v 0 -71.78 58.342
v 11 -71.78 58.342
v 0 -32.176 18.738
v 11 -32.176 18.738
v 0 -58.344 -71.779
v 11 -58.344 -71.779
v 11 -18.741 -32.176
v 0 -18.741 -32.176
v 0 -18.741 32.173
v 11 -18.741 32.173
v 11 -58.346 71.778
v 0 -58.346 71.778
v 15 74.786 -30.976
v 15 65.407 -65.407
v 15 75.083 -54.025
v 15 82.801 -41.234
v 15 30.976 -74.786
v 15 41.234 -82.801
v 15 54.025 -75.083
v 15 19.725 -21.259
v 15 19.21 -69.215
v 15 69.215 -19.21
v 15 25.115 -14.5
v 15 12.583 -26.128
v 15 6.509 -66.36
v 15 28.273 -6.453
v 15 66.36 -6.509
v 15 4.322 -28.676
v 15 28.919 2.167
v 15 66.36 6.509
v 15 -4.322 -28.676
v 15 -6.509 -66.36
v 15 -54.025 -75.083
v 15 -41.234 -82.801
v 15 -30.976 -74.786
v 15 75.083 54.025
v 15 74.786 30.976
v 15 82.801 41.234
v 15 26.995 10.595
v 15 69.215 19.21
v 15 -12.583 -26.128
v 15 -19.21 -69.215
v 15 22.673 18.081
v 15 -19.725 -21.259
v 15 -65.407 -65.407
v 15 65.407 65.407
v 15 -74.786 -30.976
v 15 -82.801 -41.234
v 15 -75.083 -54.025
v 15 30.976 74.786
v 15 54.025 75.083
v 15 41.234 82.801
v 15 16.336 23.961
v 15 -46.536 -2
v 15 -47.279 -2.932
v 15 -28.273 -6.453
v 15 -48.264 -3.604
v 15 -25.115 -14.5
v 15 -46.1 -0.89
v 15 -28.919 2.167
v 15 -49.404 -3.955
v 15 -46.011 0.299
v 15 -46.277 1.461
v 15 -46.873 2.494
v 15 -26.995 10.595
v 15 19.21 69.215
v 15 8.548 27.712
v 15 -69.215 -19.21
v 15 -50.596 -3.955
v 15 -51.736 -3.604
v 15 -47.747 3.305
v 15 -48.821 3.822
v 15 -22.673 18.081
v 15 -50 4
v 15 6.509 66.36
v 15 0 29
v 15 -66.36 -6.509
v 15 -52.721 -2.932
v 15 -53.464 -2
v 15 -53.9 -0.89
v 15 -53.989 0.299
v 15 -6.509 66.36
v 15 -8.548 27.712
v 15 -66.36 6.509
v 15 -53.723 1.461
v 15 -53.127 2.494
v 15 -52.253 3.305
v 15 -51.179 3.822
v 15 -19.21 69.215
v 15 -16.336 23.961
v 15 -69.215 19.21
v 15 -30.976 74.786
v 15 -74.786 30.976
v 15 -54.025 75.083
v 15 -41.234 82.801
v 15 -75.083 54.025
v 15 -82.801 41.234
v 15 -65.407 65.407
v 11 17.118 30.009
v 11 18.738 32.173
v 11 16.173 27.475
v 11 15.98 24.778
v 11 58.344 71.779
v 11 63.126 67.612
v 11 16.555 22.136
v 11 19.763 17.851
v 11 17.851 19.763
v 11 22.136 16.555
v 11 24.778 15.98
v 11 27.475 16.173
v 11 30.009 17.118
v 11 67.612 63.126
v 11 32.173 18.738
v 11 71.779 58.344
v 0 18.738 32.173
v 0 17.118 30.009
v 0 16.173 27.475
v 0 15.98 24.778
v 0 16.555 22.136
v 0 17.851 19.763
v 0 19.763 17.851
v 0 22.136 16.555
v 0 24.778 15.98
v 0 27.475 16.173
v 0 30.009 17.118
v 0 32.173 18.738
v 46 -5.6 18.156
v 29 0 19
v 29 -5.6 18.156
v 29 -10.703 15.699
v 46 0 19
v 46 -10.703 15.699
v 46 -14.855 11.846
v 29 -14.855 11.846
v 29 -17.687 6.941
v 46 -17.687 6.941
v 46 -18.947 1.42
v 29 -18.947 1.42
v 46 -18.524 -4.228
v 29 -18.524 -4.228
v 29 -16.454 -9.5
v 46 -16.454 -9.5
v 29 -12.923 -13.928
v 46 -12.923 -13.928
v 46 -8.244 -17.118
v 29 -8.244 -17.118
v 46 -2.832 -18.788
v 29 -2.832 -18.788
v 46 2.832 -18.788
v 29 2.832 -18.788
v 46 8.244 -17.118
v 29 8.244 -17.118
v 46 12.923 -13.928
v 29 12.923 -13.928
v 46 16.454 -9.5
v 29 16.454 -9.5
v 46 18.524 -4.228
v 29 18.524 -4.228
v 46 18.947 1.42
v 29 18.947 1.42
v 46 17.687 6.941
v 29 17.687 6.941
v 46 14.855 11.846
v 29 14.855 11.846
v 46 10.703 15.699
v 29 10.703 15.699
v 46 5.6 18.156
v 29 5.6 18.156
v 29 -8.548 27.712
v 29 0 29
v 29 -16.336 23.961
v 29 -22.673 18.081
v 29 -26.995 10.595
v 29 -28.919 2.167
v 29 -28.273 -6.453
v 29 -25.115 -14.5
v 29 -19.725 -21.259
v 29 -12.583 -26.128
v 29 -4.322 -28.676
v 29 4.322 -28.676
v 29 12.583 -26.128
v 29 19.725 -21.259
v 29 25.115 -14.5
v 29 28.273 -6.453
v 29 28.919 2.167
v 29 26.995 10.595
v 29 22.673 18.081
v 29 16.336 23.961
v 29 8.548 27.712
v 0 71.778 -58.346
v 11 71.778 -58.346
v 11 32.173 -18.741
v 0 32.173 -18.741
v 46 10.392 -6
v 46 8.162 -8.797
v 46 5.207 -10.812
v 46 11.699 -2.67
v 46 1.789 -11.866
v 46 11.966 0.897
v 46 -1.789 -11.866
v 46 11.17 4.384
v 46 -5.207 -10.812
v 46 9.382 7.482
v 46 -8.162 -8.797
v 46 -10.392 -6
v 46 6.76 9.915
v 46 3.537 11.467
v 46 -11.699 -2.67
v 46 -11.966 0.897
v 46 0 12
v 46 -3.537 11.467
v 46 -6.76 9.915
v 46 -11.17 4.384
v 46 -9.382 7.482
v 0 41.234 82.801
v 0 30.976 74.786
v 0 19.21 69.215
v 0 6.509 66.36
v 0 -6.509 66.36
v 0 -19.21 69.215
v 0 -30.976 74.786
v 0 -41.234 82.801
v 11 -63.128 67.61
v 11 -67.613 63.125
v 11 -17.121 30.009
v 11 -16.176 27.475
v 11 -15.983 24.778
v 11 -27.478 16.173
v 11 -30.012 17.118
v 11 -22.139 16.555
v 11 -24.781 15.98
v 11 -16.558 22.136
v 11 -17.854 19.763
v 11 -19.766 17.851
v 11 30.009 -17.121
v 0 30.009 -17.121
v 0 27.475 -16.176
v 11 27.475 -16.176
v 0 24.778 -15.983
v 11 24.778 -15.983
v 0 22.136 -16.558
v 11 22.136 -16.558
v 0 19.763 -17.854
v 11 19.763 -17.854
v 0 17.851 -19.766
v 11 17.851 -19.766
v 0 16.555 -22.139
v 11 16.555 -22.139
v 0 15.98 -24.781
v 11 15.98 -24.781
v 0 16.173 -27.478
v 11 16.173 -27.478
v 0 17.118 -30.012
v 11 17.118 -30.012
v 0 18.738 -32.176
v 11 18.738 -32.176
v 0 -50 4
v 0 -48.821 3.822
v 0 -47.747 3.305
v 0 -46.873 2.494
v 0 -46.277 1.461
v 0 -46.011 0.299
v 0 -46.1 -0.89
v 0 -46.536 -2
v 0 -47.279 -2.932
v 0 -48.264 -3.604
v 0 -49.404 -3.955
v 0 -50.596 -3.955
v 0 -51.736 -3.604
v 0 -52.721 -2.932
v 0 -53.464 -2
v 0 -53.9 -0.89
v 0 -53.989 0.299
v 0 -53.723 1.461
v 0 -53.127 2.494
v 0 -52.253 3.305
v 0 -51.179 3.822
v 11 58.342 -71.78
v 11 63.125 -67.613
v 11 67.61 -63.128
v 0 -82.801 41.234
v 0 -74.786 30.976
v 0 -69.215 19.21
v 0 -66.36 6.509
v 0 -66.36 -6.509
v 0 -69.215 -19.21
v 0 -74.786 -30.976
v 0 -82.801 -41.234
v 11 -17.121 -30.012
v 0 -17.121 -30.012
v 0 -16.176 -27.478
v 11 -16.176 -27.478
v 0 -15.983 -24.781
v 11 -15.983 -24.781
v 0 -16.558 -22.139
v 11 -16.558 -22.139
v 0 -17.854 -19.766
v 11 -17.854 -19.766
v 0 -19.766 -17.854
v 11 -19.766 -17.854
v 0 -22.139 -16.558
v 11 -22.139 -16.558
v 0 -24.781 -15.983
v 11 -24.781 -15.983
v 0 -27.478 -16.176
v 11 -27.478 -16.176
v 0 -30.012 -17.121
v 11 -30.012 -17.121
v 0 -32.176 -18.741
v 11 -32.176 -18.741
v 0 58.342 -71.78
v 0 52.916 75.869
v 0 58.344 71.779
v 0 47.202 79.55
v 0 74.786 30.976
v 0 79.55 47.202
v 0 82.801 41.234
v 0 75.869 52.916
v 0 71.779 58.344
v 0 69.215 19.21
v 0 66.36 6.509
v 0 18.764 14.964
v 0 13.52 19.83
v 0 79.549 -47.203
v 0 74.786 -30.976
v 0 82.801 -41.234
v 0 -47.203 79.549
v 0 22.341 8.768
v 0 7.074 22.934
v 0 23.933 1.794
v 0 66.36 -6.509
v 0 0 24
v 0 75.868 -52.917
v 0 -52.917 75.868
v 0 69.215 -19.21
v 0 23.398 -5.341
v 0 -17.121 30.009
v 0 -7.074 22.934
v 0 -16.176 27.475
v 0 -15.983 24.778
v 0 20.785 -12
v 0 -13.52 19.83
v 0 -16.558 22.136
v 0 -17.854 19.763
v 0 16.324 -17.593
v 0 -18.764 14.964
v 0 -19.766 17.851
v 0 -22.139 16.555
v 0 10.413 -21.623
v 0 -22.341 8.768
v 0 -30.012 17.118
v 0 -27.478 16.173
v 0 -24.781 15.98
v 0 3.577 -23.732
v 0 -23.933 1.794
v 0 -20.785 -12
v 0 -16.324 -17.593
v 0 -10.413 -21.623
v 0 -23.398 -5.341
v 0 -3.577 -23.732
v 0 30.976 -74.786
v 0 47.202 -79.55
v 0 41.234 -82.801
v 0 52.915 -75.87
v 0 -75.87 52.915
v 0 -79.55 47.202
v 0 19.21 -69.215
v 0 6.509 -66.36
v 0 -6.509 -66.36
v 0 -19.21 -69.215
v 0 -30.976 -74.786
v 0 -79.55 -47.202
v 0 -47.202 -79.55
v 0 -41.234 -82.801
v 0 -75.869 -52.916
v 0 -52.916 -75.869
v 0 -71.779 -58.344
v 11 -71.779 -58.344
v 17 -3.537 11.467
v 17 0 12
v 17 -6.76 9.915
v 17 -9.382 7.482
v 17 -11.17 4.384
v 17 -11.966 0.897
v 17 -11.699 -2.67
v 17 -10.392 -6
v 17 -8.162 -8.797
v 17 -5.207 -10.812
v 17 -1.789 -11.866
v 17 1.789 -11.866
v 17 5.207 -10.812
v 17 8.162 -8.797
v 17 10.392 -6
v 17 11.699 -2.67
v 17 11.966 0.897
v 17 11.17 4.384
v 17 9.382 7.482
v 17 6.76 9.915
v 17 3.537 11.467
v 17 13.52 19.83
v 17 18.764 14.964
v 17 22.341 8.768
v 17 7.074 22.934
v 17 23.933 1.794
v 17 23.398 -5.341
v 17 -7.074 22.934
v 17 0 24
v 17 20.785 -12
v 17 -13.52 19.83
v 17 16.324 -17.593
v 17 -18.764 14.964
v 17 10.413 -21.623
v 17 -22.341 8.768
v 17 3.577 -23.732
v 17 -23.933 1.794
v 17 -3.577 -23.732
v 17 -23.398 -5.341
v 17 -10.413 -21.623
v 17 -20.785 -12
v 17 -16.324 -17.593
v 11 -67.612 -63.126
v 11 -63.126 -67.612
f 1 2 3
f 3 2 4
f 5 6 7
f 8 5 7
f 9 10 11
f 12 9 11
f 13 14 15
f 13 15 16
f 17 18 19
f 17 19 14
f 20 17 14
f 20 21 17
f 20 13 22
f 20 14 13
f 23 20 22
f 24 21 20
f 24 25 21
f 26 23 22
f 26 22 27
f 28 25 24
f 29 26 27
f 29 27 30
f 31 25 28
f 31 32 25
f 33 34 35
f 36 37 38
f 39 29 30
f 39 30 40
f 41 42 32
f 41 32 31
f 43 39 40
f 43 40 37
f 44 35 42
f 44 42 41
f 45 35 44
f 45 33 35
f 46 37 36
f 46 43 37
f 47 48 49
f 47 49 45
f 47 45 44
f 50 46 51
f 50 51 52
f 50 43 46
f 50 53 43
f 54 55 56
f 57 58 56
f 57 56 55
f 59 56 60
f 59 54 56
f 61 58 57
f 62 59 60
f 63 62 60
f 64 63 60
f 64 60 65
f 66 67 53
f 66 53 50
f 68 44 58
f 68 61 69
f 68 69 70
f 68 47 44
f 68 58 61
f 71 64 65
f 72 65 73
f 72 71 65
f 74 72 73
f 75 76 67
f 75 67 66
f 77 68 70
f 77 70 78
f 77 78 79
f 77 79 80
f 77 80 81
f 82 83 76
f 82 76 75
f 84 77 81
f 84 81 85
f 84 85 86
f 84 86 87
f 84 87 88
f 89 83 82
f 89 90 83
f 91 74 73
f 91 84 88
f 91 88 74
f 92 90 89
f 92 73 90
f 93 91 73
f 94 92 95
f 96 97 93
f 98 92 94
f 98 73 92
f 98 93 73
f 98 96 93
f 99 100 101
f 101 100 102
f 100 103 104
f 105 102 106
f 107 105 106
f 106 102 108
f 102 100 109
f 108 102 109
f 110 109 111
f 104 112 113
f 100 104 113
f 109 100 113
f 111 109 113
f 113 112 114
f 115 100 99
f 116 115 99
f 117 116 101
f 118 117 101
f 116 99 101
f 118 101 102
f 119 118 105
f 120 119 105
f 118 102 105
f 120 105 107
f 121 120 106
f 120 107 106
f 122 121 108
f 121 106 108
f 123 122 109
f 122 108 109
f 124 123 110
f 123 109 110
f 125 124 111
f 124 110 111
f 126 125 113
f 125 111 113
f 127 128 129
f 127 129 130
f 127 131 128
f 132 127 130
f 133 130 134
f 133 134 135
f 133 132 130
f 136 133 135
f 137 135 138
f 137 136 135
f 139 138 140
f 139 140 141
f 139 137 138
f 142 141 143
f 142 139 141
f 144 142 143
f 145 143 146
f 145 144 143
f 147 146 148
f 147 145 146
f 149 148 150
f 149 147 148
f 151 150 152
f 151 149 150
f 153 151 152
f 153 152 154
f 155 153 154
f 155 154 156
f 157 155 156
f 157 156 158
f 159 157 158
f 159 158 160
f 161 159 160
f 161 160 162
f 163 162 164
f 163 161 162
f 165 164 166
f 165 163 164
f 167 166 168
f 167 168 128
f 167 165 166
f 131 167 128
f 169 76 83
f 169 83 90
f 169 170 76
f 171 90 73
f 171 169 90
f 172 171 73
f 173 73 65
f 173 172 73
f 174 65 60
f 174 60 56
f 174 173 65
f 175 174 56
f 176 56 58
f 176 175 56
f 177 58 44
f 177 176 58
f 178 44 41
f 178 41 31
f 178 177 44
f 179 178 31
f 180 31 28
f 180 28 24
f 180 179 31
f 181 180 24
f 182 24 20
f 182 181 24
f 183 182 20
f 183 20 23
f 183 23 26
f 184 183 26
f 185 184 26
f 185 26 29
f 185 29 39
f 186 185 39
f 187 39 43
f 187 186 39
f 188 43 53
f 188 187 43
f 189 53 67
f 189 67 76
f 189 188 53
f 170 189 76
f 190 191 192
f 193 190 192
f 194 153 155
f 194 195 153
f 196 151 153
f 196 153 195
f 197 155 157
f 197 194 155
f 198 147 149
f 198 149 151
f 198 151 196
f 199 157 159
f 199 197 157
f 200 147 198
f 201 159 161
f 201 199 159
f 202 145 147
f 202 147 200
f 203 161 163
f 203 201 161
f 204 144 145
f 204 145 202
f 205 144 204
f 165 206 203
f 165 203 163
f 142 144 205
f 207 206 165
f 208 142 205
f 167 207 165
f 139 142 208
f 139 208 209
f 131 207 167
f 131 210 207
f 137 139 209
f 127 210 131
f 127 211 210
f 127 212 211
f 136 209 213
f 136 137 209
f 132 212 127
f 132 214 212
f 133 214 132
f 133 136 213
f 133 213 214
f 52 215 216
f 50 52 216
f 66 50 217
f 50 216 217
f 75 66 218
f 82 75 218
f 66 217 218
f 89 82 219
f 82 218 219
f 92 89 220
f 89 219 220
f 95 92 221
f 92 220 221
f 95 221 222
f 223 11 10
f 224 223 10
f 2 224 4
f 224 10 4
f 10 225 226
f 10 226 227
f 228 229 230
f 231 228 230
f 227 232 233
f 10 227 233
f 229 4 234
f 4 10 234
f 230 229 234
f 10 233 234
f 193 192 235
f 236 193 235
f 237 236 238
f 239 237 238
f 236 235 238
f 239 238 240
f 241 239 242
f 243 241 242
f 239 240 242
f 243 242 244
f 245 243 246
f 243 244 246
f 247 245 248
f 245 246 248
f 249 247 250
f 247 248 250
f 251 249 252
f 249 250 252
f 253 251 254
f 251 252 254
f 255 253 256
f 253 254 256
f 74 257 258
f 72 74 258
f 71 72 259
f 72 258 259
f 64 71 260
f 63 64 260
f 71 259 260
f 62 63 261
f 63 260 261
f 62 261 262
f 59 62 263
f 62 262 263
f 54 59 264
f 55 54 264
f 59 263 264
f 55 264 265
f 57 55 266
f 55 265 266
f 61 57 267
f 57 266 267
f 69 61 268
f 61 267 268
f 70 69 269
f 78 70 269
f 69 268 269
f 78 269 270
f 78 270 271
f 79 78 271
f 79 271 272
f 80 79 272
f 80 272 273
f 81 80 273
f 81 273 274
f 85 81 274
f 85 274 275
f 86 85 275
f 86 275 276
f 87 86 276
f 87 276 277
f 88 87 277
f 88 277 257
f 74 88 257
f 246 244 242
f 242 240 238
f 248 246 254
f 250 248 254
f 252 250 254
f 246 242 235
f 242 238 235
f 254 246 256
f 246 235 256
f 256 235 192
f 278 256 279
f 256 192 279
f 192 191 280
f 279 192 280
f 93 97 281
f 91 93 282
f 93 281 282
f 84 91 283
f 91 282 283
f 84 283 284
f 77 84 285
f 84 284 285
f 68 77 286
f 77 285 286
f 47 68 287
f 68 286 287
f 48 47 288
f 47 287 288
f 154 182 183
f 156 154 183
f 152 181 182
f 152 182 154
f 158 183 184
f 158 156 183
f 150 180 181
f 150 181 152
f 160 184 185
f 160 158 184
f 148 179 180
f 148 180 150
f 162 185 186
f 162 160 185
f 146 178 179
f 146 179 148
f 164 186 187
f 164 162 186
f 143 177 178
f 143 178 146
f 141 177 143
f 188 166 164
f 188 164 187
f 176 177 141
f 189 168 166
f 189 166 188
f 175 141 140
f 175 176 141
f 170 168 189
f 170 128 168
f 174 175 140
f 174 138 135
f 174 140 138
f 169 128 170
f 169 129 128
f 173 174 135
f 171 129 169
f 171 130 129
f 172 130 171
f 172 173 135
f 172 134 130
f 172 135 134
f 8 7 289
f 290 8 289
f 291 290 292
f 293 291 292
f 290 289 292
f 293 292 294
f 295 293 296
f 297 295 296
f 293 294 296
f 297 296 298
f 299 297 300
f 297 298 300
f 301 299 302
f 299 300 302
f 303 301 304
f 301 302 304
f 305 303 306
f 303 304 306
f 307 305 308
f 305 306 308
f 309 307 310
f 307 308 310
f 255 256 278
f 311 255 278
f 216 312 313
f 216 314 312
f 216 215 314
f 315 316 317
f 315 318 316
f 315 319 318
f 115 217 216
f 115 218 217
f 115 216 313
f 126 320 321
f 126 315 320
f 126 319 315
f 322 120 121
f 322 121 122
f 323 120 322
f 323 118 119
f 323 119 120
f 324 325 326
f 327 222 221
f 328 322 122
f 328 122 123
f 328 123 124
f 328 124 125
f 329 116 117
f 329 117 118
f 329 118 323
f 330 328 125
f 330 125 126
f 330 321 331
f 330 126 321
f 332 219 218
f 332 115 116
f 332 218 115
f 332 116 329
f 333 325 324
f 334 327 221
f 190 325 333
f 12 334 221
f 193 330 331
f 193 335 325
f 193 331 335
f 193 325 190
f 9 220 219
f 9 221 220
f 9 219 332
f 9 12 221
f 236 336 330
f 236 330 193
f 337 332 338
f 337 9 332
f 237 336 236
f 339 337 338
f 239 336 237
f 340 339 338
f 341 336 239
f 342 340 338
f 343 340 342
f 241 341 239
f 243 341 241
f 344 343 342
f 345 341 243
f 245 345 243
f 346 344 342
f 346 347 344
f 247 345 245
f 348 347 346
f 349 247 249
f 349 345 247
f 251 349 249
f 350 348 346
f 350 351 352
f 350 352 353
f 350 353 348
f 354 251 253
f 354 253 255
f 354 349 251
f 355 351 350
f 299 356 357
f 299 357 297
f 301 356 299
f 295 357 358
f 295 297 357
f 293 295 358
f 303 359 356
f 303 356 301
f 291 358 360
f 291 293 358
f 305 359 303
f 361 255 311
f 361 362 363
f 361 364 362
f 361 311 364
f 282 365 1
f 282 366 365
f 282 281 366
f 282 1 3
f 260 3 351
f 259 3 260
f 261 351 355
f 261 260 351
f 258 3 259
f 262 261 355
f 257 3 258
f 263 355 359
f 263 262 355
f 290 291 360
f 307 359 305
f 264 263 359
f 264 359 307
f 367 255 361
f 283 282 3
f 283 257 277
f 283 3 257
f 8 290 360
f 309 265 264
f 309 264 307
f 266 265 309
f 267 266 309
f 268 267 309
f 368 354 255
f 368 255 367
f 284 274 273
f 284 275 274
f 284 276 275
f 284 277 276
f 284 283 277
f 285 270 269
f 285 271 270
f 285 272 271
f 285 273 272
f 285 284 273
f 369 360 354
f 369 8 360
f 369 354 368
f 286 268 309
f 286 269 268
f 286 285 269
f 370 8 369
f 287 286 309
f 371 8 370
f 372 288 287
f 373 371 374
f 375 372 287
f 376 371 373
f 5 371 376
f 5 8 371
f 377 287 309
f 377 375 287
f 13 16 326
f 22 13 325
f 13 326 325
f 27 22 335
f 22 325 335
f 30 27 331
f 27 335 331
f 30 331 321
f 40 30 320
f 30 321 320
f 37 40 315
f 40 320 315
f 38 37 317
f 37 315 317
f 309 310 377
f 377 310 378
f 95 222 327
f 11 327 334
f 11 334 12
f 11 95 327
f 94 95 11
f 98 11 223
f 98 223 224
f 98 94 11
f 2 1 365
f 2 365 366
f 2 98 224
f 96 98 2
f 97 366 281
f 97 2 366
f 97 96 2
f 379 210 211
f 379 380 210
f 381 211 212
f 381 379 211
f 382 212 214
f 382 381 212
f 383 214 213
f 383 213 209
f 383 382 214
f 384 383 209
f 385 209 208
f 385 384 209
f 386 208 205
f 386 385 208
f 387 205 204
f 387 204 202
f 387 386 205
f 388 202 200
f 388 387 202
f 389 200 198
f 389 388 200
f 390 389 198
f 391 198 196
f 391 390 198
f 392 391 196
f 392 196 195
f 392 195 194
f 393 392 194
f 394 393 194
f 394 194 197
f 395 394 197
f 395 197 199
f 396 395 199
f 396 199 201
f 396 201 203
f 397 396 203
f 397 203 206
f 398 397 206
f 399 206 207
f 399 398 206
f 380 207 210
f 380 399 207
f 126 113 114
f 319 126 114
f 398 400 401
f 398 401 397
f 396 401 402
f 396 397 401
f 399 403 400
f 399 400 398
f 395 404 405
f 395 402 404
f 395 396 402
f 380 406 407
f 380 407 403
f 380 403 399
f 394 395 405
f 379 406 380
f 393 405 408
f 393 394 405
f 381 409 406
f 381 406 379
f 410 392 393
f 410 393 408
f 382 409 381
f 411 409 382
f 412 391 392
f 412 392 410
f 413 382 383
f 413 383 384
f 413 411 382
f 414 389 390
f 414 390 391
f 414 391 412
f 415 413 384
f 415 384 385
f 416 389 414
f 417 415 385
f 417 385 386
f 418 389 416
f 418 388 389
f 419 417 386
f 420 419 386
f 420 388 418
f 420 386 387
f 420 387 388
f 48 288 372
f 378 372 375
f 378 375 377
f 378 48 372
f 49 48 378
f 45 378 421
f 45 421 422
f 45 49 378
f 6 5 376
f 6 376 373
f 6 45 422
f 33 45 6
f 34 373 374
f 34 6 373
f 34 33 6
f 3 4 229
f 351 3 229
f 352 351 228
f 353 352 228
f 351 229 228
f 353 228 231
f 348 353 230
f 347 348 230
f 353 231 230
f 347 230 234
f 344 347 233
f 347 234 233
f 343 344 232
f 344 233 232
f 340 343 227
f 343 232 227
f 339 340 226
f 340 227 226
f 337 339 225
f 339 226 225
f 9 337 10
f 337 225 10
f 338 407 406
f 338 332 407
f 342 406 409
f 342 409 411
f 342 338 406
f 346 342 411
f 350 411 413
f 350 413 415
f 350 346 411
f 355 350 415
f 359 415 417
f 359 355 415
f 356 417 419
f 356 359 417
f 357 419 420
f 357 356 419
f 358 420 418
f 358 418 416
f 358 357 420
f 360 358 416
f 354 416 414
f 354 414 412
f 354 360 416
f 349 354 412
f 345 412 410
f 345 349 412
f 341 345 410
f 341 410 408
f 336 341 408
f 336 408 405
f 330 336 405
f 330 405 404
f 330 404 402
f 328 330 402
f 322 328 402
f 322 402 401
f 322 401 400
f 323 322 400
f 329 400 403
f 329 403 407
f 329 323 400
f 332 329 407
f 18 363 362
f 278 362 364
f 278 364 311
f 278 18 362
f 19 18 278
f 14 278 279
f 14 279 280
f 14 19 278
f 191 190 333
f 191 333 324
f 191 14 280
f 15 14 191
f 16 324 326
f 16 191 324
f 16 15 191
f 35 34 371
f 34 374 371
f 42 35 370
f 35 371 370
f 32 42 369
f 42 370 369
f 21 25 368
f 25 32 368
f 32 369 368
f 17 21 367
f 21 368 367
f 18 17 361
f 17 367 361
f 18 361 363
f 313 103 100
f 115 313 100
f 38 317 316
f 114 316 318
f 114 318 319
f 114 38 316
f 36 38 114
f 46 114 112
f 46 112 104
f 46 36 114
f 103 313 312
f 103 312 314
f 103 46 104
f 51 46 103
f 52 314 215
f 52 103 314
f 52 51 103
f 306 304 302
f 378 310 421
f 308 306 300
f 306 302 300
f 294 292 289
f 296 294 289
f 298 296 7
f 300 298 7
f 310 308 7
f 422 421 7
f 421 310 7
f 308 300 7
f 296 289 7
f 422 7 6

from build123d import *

# Parameters (mm, degrees)
ESQUISSE2_R             = 59
ENL_V_MAT_EXTRU_1_DEPTH = 139.666866987
ENL_V_START             = -11
ENL_V_MAT_EXTRU_2_DEPTH = 11
ESQUISSE4_R             = 4
ENL_V_MAT_EXTRU_3_DEPTH = 126.809424138


with BuildPart() as part:
    # Esquisse1 → Base-Révolution (revolve)
    with BuildSketch(Plane.XY, mode=Mode.PRIVATE) as base_r_volution_sk:
        Polygon((0, 24), (0, 92.5), (15, 92.5), (15, 29), (29, 29), (29, 19), (46, 19), (46, 12), (17, 12), (17, 24), align=None)
    revolve(base_r_volution_sk.sketch.rotate(Axis((0, 0, 0), (1, 0, 0)), 90), axis=Axis((0, 0, 0), (1, 0, 0)))

    # Esquisse2 → Enlèv. mat.-Extru.1 (cut, through all)
    with BuildSketch(Plane.ZY):
        with Locations((0, 125)):
            Circle(ESQUISSE2_R)
        with Locations((125, 0)):
            Circle(ESQUISSE2_R)
        with Locations((0, -125)):
            Circle(ESQUISSE2_R)
        with Locations((-125, 0)):
            Circle(ESQUISSE2_R)
    extrude(amount=-ENL_V_MAT_EXTRU_1_DEPTH, mode=Mode.SUBTRACT)

    # Esquisse3 → Enlèv. mat.-Extru.2 (cut)
    with BuildSketch(Plane.ZY.offset(ENL_V_START)):
        with BuildLine():
            Line((18.738329701, 32.173358544), (58.343994937, 71.77902378))
            ThreePointArc((58.343994937, 71.77902378), (65.40737726, 65.40737726), (71.77902378, 58.343994937))
            Line((71.77902378, 58.343994937), (32.173358544, 18.738329701))
            ThreePointArc((32.173358544, 18.738329701), (18.738329701, 18.738329701), (18.738329701, 32.173358544))
        make_face()
        with BuildLine():
            Line((32.173358544, -18.741271209), (71.77902378, -58.346936444))
            ThreePointArc((71.77902378, -58.346936444), (65.40737726, -65.410318767), (58.343994937, -71.781965287))
            Line((58.343994937, -71.781965287), (18.738329701, -32.176300051))
            ThreePointArc((18.738329701, -32.176300051), (18.738329701, -18.741271209), (32.173358544, -18.741271209))
        make_face()
        with BuildLine():
            Line((-18.741271209, -32.176300051), (-58.346936444, -71.781965287))
            ThreePointArc((-58.346936444, -71.781965287), (-65.410318767, -65.410318767), (-71.781965287, -58.346936444))
            Line((-71.781965287, -58.346936444), (-32.176300051, -18.741271209))
            ThreePointArc((-32.176300051, -18.741271209), (-18.741271209, -18.741271209), (-18.741271209, -32.176300051))
        make_face()
        with BuildLine():
            Line((-32.176300051, 18.738329701), (-71.781965287, 58.343994937))
            ThreePointArc((-71.781965287, 58.343994937), (-65.410318767, 65.40737726), (-58.346936444, 71.77902378))
            Line((-58.346936444, 71.77902378), (-18.741271209, 32.173358544))
            ThreePointArc((-18.741271209, 32.173358544), (-18.741271209, 18.738329701), (-32.176300051, 18.738329701))
        make_face()
    extrude(amount=ENL_V_MAT_EXTRU_2_DEPTH, mode=Mode.SUBTRACT)

    # Esquisse4 → Enlèv. mat.-Extru.3 (cut, through all)
    with BuildSketch(Plane.ZY):
        with Locations((0, -50)):
            Circle(ESQUISSE4_R)
    extrude(amount=-ENL_V_MAT_EXTRU_3_DEPTH, mode=Mode.SUBTRACT)


solid = part.part
